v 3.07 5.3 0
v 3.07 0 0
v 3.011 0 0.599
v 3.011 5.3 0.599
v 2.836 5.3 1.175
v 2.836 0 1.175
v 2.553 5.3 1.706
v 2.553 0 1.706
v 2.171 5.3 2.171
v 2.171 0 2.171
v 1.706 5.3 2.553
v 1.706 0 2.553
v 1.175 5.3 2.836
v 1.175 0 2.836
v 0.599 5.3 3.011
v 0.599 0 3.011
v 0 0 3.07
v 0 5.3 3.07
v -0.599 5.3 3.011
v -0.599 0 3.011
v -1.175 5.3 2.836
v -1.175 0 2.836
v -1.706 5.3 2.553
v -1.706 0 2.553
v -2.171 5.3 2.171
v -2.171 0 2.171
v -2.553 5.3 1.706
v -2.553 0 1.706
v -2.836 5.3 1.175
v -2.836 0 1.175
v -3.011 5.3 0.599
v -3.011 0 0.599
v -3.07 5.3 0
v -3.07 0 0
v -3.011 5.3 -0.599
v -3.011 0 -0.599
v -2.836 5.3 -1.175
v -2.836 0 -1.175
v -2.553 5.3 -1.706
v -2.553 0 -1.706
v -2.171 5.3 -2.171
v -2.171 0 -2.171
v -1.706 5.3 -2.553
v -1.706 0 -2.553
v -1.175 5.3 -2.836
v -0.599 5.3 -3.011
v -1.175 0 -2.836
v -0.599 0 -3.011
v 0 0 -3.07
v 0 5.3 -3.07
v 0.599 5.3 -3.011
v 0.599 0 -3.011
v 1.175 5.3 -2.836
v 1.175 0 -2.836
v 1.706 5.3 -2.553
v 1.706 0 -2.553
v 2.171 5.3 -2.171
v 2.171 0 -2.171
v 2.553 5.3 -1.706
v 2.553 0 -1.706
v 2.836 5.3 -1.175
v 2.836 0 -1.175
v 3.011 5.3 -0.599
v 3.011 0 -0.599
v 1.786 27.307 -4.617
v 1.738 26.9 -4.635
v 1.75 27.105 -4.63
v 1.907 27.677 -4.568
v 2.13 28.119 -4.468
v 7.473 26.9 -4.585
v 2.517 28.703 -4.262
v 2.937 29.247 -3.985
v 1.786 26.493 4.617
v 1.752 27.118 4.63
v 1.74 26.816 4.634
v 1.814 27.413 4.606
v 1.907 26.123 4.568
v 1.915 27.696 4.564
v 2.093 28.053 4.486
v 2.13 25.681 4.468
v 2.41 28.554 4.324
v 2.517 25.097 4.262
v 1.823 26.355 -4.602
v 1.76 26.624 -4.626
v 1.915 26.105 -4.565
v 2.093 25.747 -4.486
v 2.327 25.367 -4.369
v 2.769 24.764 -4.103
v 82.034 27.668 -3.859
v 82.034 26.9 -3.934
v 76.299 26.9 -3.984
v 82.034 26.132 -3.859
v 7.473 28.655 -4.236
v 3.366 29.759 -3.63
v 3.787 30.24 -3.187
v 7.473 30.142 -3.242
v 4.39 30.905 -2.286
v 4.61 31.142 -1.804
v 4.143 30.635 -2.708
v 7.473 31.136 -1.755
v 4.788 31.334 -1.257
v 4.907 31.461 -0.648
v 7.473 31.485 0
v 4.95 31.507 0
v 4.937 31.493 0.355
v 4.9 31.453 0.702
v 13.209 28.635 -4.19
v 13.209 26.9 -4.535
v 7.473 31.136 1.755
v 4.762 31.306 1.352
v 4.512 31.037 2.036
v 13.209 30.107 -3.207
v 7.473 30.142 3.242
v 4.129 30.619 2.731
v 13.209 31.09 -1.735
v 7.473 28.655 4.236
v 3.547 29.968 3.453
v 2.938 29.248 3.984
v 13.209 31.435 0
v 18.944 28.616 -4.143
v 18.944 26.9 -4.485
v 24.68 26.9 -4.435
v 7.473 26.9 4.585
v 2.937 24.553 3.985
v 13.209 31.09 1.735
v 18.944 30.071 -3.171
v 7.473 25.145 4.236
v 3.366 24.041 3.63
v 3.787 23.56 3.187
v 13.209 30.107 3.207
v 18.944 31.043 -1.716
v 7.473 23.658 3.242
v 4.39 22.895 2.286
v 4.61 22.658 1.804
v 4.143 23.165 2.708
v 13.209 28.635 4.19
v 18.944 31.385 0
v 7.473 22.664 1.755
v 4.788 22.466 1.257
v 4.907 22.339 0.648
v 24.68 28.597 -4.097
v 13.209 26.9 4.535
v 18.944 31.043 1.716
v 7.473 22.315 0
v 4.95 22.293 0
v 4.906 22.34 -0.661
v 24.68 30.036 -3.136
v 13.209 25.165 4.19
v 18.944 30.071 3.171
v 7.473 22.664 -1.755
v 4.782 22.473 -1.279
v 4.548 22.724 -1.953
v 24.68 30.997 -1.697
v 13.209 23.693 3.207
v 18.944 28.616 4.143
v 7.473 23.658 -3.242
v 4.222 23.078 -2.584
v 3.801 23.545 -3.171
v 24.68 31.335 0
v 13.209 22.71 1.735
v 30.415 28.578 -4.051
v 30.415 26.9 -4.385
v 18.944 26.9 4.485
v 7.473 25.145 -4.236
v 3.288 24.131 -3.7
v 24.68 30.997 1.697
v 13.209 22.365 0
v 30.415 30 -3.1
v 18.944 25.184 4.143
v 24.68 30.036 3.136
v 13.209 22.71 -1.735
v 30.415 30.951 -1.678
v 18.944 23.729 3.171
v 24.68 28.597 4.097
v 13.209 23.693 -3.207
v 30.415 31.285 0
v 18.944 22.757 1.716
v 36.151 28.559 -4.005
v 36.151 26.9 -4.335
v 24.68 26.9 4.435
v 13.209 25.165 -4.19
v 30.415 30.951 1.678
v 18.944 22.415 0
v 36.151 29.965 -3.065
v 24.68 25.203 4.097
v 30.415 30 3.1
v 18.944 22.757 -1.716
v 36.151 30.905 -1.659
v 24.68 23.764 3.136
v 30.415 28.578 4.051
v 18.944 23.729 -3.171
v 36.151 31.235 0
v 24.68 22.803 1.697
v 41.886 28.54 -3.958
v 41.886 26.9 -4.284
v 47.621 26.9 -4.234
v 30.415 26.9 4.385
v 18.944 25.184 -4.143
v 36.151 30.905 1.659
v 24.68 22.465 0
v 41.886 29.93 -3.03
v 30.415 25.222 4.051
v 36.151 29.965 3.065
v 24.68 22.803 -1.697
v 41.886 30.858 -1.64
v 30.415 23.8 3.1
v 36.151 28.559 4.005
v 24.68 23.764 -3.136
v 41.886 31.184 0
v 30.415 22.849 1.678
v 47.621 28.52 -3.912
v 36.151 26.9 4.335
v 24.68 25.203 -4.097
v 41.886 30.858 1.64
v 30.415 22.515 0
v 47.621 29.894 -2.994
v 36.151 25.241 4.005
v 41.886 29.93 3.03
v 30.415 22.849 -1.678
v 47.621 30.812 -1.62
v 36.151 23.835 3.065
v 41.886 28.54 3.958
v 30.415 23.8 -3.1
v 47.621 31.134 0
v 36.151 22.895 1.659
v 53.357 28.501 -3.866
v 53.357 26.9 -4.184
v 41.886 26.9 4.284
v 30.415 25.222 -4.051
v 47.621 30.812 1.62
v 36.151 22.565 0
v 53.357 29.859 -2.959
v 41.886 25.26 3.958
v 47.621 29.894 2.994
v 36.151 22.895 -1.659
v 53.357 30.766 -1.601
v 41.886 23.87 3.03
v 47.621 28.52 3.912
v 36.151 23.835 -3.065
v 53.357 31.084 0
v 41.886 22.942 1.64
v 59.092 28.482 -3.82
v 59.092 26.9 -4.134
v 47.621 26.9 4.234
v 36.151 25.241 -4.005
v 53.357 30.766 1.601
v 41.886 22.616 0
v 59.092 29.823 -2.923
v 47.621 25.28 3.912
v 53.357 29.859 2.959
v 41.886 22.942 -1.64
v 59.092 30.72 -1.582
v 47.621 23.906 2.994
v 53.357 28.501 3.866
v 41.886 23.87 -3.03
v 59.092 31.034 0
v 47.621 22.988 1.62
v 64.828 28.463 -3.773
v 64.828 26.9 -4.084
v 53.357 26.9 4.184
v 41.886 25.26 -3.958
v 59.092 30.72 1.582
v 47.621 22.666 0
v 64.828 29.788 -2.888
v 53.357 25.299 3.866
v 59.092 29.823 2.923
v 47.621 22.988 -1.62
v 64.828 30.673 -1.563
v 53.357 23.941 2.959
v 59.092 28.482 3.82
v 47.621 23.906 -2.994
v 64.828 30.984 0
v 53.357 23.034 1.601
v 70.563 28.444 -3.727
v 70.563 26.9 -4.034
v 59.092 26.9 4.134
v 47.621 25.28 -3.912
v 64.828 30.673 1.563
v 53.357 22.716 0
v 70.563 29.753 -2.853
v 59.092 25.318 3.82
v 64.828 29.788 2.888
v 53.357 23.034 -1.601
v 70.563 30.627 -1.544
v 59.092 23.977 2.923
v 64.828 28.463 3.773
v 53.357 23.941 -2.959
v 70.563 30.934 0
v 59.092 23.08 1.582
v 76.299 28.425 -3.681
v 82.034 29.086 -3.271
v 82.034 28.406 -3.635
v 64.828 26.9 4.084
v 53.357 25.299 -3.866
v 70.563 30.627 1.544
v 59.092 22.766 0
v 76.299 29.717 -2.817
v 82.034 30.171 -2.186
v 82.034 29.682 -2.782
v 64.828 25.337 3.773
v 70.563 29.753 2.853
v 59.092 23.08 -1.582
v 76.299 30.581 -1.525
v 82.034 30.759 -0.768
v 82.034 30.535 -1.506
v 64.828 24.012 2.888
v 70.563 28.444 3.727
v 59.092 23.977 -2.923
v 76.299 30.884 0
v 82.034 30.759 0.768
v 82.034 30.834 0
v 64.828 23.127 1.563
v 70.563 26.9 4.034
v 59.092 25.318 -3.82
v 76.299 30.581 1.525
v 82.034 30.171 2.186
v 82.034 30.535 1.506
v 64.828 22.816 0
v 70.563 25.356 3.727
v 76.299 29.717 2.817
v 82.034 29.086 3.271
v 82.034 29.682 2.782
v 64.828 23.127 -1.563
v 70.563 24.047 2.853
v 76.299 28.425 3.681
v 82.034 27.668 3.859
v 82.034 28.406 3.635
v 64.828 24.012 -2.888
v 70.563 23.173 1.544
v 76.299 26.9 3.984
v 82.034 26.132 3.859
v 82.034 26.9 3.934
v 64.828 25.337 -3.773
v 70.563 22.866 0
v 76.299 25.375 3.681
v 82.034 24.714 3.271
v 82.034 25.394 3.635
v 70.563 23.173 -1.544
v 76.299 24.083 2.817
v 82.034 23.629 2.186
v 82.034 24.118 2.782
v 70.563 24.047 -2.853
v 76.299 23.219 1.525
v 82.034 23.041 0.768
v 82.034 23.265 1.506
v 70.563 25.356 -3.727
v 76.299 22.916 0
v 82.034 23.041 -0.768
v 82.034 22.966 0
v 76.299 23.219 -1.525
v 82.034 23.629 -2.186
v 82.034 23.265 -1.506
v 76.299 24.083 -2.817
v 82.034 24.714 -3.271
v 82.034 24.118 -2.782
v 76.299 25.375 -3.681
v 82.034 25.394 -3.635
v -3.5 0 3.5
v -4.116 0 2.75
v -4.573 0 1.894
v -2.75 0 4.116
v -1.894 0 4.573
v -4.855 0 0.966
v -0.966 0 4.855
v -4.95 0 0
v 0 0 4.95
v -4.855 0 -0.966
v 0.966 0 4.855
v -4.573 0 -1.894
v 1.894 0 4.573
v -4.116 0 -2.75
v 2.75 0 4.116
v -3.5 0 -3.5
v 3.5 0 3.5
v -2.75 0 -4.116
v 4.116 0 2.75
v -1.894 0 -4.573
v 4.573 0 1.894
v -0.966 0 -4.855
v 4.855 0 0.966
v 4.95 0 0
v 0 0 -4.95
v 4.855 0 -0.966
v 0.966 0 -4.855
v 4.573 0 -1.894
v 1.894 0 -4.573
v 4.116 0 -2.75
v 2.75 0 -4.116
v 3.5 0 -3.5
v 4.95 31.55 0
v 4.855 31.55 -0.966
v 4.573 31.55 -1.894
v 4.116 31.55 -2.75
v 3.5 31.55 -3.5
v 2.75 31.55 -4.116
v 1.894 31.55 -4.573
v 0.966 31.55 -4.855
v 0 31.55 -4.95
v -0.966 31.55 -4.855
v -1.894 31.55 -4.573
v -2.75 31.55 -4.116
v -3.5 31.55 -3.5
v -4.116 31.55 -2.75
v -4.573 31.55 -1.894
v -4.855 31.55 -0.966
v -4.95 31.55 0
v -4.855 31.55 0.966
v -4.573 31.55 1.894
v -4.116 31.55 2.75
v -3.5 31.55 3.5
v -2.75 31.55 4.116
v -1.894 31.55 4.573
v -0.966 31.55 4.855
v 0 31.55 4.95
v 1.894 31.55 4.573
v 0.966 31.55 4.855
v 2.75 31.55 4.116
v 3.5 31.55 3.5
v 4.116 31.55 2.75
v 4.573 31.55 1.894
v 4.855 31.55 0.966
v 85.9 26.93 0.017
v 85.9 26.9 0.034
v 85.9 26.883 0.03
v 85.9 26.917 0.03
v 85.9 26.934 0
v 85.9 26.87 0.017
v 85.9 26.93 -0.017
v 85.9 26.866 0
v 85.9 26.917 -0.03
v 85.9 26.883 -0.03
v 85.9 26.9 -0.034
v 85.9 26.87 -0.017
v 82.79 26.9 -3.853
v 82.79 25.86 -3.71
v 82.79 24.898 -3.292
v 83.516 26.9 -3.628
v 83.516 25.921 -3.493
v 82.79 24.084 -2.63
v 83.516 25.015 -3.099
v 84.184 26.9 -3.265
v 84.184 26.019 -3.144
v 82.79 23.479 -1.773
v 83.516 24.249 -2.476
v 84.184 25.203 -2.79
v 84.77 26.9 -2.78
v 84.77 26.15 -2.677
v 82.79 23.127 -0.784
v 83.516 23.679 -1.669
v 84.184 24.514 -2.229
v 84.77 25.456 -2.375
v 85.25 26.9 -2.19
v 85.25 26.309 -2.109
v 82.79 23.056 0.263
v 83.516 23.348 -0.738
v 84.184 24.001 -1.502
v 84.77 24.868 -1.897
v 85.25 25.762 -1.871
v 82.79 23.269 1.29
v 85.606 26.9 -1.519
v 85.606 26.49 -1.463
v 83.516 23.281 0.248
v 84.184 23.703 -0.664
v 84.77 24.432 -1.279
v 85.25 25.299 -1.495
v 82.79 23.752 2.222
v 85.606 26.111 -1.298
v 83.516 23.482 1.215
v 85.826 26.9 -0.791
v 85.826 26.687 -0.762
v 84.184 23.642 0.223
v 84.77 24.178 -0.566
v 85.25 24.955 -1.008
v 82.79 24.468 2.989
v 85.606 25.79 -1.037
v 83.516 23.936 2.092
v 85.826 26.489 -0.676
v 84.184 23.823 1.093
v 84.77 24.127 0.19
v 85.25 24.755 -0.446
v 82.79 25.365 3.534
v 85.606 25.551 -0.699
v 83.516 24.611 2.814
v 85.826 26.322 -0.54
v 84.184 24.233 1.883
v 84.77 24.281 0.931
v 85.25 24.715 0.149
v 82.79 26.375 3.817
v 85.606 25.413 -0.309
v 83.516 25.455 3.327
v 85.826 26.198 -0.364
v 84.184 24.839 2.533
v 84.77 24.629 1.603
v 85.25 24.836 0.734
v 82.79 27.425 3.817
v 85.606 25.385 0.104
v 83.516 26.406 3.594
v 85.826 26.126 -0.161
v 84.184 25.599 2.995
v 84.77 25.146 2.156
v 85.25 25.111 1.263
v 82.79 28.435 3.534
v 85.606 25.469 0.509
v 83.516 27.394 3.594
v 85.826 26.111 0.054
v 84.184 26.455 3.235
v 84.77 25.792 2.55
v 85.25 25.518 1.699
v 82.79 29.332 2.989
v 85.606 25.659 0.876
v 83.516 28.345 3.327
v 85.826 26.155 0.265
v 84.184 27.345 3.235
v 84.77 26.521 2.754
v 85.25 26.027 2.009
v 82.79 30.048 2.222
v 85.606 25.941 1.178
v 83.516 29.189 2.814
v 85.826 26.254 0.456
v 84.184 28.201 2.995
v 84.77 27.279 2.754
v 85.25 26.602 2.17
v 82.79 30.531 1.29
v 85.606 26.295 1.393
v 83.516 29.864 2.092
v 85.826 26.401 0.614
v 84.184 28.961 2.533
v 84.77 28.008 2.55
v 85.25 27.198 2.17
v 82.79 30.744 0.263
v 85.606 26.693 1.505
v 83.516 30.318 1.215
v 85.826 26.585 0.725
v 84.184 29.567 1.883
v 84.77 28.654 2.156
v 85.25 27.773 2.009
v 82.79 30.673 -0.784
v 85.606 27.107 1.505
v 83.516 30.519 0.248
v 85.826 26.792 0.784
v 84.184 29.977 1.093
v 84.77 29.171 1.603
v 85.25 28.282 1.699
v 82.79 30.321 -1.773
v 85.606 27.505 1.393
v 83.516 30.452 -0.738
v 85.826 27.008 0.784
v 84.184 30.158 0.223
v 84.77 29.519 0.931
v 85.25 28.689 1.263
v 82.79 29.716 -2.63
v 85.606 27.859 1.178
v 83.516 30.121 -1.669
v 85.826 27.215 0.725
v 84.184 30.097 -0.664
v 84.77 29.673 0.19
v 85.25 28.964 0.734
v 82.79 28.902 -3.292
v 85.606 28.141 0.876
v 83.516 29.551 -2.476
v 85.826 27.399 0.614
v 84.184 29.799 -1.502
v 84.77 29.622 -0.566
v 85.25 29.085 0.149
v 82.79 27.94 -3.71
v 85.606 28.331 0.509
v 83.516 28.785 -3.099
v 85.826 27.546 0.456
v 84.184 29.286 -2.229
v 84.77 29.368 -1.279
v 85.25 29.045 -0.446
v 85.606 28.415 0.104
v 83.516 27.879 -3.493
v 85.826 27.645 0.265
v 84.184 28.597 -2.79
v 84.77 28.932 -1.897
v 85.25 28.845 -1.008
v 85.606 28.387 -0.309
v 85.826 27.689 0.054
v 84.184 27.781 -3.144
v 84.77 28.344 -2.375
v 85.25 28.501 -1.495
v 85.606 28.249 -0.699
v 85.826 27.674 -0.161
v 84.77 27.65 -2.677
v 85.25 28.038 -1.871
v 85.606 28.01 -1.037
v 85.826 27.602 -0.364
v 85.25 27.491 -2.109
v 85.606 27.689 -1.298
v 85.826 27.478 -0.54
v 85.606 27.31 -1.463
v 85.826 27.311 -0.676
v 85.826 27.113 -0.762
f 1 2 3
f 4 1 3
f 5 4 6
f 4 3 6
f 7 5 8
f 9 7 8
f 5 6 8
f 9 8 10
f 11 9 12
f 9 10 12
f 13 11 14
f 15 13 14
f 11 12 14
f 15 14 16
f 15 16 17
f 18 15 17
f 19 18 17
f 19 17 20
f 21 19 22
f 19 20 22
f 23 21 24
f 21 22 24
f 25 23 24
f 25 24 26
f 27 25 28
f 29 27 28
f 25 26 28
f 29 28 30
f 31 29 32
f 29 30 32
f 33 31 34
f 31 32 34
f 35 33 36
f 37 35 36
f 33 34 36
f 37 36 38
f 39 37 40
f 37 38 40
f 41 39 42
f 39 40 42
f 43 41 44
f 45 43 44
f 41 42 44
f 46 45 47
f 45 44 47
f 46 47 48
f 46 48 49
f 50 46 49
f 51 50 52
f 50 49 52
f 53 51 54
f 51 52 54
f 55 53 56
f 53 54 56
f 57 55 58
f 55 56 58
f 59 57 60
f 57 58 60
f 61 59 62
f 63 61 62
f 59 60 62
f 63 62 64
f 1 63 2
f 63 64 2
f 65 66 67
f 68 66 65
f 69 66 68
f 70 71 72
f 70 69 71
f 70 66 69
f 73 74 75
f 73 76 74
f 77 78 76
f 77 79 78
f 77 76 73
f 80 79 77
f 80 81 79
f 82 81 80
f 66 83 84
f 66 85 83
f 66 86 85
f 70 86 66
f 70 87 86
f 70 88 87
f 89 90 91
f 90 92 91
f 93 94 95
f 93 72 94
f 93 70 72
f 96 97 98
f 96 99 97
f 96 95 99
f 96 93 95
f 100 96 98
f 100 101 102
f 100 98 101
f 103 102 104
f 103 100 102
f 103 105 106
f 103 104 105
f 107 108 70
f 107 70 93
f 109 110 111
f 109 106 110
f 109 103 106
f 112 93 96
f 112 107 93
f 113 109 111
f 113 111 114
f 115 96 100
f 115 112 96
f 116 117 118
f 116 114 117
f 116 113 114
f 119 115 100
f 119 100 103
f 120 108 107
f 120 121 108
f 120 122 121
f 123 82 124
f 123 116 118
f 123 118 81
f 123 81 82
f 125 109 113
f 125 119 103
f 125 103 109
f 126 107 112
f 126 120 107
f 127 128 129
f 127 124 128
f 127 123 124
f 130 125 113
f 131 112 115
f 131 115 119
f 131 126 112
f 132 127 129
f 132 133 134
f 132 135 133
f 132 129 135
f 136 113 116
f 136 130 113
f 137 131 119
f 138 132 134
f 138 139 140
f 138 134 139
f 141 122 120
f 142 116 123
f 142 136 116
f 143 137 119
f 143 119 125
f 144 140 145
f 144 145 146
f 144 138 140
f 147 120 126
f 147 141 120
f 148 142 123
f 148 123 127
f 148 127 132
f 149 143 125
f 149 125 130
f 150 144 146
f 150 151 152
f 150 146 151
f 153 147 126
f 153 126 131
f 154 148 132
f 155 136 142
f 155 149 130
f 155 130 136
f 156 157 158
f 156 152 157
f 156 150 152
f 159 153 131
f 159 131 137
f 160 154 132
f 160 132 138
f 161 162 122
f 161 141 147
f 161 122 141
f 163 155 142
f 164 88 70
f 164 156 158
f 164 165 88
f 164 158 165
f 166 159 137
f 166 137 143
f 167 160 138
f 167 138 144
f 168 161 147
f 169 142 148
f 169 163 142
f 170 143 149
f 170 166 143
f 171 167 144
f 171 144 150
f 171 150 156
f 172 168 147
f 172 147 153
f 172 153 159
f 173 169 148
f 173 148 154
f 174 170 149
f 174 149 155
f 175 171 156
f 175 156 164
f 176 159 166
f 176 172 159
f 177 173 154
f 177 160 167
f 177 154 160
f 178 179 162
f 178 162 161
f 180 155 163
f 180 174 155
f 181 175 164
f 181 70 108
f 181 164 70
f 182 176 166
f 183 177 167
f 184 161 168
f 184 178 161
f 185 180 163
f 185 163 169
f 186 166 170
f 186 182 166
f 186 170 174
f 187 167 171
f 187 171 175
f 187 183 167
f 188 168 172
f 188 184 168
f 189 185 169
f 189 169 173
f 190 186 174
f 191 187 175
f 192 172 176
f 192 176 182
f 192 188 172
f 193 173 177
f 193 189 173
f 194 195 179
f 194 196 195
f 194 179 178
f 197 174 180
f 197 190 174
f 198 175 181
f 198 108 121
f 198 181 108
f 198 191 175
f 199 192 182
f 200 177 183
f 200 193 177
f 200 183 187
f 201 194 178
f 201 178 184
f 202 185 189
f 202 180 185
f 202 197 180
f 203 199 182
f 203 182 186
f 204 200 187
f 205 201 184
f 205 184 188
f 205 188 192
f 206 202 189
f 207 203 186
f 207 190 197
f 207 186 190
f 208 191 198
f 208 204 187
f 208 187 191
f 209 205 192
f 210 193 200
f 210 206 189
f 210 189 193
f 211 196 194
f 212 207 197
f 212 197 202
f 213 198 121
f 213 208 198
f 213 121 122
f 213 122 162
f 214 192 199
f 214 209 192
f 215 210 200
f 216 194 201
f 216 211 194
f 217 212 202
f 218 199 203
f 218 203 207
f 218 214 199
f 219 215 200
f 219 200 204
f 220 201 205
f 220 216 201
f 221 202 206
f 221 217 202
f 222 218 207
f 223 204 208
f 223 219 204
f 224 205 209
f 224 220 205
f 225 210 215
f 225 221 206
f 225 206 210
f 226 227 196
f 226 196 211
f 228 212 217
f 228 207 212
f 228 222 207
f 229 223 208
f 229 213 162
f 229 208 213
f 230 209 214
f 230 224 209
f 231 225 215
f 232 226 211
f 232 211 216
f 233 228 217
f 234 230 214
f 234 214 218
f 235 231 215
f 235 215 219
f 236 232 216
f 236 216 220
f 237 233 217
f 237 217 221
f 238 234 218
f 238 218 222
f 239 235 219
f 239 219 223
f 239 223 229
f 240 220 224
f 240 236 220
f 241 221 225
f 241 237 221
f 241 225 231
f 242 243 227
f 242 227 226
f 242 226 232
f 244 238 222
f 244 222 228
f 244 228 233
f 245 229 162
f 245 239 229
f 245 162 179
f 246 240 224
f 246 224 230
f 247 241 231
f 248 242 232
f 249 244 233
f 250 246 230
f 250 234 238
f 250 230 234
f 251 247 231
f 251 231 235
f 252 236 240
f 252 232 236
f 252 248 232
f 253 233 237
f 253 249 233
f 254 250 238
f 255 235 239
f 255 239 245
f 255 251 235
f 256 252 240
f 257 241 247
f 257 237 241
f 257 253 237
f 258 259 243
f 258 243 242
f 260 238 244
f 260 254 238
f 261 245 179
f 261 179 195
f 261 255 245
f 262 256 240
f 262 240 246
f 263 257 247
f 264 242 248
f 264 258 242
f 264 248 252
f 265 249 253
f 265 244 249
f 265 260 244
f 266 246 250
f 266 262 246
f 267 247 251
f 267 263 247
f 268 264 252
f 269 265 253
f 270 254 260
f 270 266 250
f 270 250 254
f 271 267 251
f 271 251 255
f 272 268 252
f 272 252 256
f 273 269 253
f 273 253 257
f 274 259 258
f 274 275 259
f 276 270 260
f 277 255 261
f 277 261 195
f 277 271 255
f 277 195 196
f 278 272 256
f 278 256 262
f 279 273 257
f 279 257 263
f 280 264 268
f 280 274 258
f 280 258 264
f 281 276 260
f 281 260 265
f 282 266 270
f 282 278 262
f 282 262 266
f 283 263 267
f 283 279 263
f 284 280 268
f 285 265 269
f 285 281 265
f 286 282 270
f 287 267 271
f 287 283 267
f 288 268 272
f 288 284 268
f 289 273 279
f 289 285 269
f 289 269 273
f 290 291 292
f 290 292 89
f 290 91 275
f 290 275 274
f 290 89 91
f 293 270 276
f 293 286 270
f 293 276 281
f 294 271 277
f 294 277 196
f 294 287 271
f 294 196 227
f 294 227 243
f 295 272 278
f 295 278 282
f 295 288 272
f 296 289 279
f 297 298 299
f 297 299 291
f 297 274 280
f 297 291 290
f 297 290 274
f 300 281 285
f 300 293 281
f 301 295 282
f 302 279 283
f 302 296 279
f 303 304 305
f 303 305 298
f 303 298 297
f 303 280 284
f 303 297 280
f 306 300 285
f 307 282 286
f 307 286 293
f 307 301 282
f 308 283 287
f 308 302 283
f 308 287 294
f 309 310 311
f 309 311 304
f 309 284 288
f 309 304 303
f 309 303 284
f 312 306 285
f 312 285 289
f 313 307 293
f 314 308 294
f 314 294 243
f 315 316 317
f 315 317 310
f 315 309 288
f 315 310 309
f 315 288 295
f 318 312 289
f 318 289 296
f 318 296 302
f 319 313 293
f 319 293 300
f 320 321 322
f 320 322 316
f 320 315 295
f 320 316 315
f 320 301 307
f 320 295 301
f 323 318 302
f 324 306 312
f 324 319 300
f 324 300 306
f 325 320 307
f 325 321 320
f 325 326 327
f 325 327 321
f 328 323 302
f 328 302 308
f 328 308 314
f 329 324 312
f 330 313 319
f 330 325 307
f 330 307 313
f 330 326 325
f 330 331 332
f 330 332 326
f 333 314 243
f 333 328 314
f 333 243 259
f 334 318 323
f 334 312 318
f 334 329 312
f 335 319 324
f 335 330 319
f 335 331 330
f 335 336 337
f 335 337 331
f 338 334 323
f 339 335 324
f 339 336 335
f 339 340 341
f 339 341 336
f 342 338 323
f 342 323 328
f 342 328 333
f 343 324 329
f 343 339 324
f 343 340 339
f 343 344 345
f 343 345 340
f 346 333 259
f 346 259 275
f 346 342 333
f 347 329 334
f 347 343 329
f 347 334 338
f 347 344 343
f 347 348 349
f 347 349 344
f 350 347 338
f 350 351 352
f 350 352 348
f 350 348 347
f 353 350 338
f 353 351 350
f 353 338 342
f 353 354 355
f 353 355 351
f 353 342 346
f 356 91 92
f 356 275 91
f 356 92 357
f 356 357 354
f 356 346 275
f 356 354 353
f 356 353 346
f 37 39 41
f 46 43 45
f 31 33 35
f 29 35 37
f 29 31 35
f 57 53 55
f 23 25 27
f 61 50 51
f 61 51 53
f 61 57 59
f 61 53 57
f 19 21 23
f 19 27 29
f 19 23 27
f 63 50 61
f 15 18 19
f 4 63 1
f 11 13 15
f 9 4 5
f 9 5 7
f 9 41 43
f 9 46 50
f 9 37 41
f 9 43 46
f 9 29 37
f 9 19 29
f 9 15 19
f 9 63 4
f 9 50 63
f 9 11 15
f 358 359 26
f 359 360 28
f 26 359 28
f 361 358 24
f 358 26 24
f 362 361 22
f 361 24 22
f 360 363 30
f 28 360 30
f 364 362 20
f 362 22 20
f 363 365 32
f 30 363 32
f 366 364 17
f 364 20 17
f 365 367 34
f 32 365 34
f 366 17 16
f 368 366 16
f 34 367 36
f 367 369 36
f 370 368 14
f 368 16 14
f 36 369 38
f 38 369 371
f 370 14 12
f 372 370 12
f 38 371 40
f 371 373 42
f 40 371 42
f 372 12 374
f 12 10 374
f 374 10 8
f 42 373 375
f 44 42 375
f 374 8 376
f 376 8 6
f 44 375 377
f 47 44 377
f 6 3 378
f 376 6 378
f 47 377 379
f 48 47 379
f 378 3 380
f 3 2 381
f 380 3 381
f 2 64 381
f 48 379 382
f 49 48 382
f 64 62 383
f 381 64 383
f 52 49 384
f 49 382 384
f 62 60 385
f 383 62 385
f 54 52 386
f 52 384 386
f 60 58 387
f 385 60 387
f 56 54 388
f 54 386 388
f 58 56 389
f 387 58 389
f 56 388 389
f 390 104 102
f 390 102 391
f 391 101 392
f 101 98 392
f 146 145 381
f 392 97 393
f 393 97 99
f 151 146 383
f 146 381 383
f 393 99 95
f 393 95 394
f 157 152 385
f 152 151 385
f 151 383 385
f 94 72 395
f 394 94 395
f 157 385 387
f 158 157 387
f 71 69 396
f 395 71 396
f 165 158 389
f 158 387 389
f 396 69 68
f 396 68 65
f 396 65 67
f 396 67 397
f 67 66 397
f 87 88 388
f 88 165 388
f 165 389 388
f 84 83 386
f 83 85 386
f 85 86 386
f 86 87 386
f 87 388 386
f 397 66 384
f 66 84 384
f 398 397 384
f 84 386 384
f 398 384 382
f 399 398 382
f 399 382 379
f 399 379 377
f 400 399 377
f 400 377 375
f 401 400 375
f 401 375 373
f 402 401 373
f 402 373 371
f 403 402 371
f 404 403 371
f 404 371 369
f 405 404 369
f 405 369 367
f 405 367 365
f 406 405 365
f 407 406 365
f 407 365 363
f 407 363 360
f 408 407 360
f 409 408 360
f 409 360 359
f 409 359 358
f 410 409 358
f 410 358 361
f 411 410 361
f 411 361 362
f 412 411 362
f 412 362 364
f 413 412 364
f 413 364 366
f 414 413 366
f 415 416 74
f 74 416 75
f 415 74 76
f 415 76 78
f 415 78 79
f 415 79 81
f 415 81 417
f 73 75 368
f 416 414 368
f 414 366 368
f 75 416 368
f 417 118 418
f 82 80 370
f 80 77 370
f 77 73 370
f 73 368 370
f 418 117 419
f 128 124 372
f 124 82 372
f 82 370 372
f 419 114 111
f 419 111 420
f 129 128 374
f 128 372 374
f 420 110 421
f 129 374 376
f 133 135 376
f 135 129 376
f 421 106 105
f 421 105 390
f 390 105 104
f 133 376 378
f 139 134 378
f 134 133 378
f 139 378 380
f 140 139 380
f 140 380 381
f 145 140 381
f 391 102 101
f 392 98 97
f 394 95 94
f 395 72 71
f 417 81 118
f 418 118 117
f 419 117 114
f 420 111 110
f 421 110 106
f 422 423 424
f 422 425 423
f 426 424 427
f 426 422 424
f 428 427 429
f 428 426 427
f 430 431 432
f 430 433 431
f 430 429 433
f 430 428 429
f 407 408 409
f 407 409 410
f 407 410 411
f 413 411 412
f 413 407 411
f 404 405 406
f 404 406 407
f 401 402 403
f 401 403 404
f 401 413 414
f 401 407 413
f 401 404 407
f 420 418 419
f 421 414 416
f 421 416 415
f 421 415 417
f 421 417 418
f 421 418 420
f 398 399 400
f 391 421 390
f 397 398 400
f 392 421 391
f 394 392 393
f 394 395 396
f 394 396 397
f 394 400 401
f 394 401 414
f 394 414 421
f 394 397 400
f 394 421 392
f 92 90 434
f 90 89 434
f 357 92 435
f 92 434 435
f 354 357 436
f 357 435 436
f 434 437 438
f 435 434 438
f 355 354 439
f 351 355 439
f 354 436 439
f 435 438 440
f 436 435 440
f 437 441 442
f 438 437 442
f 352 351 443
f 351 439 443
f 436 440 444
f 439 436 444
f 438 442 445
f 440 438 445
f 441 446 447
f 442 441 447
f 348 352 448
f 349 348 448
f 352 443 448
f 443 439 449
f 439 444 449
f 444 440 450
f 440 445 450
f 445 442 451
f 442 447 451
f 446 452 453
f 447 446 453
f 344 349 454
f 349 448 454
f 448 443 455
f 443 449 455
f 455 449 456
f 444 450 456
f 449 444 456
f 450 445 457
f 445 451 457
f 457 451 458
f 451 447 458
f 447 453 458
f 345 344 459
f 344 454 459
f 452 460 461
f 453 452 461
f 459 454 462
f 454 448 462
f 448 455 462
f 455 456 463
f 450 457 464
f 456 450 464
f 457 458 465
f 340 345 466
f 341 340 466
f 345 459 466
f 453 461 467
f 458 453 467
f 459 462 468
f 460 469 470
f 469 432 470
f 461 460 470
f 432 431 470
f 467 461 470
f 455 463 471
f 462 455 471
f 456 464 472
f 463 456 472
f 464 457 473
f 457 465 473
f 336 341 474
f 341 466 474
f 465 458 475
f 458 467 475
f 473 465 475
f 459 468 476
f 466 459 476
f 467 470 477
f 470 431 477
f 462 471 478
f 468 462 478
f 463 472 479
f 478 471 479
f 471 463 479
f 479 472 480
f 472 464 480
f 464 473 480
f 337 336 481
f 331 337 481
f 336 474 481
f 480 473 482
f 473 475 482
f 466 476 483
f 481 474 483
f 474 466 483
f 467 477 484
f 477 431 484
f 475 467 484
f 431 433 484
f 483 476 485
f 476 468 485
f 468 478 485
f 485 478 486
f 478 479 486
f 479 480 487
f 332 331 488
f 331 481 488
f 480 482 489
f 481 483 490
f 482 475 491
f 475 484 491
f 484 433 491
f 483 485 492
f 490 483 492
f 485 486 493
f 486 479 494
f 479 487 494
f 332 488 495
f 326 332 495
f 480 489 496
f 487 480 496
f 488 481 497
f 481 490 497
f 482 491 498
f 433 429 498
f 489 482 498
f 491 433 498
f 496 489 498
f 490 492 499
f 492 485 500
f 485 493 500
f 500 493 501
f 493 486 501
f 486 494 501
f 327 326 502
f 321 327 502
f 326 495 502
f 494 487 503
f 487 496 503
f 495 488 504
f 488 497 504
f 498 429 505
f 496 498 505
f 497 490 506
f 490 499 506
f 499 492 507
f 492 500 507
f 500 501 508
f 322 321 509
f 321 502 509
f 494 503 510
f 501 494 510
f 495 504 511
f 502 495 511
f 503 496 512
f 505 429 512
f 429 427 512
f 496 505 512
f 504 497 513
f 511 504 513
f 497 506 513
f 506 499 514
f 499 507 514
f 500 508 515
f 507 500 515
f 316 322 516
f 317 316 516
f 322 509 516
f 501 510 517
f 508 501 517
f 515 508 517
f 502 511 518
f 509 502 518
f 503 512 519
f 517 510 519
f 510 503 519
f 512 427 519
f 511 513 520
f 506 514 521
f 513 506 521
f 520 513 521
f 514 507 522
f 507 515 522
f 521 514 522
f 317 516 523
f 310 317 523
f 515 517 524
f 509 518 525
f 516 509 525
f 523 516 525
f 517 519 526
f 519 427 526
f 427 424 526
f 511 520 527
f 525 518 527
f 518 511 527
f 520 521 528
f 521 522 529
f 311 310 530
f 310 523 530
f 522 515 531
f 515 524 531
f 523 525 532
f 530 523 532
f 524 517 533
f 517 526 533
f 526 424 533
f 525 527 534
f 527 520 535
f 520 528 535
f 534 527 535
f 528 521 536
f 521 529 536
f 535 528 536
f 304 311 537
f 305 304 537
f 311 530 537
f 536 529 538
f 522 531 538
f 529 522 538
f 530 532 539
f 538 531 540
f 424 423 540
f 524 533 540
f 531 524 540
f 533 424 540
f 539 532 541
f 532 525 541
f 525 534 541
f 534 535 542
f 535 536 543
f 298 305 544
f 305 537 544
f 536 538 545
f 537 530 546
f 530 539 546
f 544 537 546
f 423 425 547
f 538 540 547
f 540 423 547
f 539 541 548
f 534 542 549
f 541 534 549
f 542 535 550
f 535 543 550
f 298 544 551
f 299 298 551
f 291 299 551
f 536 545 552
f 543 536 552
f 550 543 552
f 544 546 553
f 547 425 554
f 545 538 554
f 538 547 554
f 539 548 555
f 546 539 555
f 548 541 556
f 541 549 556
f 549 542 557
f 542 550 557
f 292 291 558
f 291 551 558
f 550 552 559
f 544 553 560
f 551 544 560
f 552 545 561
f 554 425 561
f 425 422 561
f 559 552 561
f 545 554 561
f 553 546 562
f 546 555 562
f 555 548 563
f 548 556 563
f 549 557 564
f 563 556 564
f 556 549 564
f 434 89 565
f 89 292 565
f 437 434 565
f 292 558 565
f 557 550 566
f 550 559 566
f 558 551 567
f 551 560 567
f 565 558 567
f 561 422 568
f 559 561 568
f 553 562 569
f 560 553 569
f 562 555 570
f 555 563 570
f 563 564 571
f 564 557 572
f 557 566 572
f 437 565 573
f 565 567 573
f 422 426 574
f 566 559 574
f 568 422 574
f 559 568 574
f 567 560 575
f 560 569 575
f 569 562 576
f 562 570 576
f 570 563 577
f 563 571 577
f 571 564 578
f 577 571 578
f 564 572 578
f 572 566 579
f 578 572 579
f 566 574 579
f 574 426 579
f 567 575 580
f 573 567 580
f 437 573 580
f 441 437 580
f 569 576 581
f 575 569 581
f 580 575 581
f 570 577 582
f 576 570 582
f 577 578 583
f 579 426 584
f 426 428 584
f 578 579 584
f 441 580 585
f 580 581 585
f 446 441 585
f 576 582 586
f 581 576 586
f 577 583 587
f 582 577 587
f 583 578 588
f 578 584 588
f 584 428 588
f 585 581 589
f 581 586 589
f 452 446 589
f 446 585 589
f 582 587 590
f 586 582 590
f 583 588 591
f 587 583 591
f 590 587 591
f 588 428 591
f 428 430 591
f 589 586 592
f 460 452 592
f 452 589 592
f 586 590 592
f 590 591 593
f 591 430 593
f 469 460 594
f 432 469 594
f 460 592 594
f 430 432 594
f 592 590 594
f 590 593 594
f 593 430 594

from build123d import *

# Parameters (mm, degrees)
SKETCH1_R           = 4.95
BOSS_EXTRUDE1_DEPTH = 31.55
SKETCH3_R           = 4.65
BOSS_EXTRUDE2_DEPTH = 85.9
BOSS_EXTRUDE2_TAPER = 0.5
FILLET1_R           = 3.9
SKETCH4_R           = 3.07
CUT_EXTRUDE1_DEPTH  = 5.3


with BuildPart() as part:
    # Sketch1 → Boss-Extrude1 (new body)
    with BuildSketch(Plane(origin=(0, 0, 0), x_dir=(1, 0, 0), z_dir=(0, 1, 0))):
        Circle(SKETCH1_R)
    extrude(amount=BOSS_EXTRUDE1_DEPTH)

    # Sketch3 → Boss-Extrude2 (add)
    with BuildSketch(Plane(origin=(0, 0, 0), x_dir=(0, 0, -1), z_dir=(1, 0, 0))):
        with Locations((0, 26.9)):
            Circle(SKETCH3_R)
    extrude(amount=BOSS_EXTRUDE2_DEPTH, taper=BOSS_EXTRUDE2_TAPER)

    # Fillet1
    fillet1_edges = [part.edges().sort_by_distance(p)[0] for p in [
        (85.9, 26.9, 3.900362057),
    ]]
    fillet(fillet1_edges, radius=FILLET1_R)

    # Sketch4 → Cut-Extrude1 (cut)
    with BuildSketch(Plane.XZ):
        Circle(SKETCH4_R)
    extrude(amount=-CUT_EXTRUDE1_DEPTH, mode=Mode.SUBTRACT)


solid = part.part
